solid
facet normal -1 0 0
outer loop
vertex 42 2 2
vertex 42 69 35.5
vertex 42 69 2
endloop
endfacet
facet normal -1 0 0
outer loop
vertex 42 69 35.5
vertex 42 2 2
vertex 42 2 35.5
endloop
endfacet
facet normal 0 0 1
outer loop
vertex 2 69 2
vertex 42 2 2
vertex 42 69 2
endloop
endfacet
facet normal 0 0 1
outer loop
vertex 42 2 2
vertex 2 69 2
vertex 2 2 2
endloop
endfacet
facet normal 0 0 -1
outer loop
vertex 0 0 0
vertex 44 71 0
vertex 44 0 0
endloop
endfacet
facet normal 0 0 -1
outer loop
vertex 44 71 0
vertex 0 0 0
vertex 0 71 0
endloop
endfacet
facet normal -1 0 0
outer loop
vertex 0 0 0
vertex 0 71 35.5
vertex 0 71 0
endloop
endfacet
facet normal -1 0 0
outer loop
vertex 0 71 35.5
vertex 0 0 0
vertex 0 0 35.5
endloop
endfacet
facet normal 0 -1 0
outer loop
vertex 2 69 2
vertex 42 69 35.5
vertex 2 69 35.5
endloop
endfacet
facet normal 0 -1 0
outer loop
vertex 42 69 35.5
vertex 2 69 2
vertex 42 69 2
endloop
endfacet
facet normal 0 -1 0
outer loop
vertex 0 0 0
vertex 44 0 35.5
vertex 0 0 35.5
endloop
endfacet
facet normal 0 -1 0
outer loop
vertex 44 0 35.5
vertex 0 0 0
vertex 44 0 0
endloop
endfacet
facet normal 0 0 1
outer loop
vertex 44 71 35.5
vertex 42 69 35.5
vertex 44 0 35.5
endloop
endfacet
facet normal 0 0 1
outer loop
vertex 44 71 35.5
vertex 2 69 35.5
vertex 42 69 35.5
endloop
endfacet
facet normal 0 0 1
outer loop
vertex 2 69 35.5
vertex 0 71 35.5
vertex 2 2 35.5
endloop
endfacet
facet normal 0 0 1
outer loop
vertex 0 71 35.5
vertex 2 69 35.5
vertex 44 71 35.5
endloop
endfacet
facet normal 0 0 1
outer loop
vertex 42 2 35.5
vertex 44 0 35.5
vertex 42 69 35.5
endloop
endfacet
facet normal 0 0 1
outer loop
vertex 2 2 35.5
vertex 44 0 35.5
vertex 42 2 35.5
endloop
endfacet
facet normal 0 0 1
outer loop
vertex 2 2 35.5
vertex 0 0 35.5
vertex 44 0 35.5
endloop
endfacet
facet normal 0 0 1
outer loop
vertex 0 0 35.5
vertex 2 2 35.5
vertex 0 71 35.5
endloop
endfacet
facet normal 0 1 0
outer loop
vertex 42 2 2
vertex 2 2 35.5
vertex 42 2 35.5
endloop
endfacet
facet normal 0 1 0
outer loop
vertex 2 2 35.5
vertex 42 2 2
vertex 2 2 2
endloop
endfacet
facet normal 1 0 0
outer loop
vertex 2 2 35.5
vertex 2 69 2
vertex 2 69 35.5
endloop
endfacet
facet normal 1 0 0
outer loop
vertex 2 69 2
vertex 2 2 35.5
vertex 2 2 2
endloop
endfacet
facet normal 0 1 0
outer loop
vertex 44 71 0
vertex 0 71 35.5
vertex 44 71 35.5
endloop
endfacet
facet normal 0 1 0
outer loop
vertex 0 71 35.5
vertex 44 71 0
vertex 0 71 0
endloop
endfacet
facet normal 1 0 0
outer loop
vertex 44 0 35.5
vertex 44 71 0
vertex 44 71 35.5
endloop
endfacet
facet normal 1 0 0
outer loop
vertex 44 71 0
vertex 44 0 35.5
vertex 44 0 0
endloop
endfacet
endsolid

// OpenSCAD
DeckSize=[40,67,67];
T=2;
PegD=5;
golden_ratio=0.618;

module internalHolder(){
	cube([DeckSize[0]+T,DeckSize[1]+T,T]);
	cube([DeckSize[0]+T,T,DeckSize[2]/2+T]);
	cube([T,DeckSize[1]+T,DeckSize[2]/2+T]);
	translate([0,DeckSize[1]+T,0])cube([DeckSize[0]+T,T,DeckSize[2]/2+T]);
	translate([DeckSize[0]+T,0,0])cube([T,DeckSize[1]+T*2,DeckSize[2]/2+T]);
};

module externalHolder(){
	cube([DeckSize[0]+T,DeckSize[1]+T,T]);
	translate([0,DeckSize[1]+T*2+(DeckSize[1]*(1-golden_ratio)+T*2),0])cube([DeckSize[0]+T,DeckSize[1]*golden_ratio+T,T]);
	translate([0,DeckSize[1]+T*2,0])cube([DeckSize[0]+T,DeckSize[1]*(1-golden_ratio)+T,T]);

	translate([0,-(DeckSize[1]+T*4),0])cube([DeckSize[0]+T,DeckSize[1]*golden_ratio+T,T]);
	translate([0,-(DeckSize[1]*(1-golden_ratio)+T*2),0])cube([DeckSize[0]+T,DeckSize[1]*(1-golden_ratio)+T,T]);

    // North
	translate([(DeckSize[0]+T*4)+(DeckSize[1]*(1-golden_ratio)),0,0])cube([DeckSize[1]*golden_ratio+T,DeckSize[2]+T,T]);
	translate([DeckSize[0]+T*2,0,0])cube([DeckSize[1]*(1-golden_ratio)+T,DeckSize[2]+T,T]);

    // South 
	translate([-((DeckSize[1]*golden_ratio+T*2)+(DeckSize[1]*(1-golden_ratio)+T*2)),0,0])cube([DeckSize[1]*golden_ratio+T,DeckSize[2]+T,T]);
	translate([-(DeckSize[1]*(1-golden_ratio)+T*2),0,0])cube([DeckSize[1]*(1-golden_ratio)+T,DeckSize[2]+T,T]);
};

module lid(){
	cube([DeckSize[0]+T*5,DeckSize[1]+T*5,T]);
	cube([DeckSize[0]+T*5,T,DeckSize[2]/2+T*5]);
	cube([T,DeckSize[1]+T*5,DeckSize[2]/2+T*5]);
	translate([0,DeckSize[1]+T*5,0])cube([DeckSize[0]+T*5,T,DeckSize[2]/2+T*5]);
	translate([DeckSize[0]+T*5,0,0])cube([T,DeckSize[1]+T*6,DeckSize[2]/2+T*5]);
};
internalHolder();
